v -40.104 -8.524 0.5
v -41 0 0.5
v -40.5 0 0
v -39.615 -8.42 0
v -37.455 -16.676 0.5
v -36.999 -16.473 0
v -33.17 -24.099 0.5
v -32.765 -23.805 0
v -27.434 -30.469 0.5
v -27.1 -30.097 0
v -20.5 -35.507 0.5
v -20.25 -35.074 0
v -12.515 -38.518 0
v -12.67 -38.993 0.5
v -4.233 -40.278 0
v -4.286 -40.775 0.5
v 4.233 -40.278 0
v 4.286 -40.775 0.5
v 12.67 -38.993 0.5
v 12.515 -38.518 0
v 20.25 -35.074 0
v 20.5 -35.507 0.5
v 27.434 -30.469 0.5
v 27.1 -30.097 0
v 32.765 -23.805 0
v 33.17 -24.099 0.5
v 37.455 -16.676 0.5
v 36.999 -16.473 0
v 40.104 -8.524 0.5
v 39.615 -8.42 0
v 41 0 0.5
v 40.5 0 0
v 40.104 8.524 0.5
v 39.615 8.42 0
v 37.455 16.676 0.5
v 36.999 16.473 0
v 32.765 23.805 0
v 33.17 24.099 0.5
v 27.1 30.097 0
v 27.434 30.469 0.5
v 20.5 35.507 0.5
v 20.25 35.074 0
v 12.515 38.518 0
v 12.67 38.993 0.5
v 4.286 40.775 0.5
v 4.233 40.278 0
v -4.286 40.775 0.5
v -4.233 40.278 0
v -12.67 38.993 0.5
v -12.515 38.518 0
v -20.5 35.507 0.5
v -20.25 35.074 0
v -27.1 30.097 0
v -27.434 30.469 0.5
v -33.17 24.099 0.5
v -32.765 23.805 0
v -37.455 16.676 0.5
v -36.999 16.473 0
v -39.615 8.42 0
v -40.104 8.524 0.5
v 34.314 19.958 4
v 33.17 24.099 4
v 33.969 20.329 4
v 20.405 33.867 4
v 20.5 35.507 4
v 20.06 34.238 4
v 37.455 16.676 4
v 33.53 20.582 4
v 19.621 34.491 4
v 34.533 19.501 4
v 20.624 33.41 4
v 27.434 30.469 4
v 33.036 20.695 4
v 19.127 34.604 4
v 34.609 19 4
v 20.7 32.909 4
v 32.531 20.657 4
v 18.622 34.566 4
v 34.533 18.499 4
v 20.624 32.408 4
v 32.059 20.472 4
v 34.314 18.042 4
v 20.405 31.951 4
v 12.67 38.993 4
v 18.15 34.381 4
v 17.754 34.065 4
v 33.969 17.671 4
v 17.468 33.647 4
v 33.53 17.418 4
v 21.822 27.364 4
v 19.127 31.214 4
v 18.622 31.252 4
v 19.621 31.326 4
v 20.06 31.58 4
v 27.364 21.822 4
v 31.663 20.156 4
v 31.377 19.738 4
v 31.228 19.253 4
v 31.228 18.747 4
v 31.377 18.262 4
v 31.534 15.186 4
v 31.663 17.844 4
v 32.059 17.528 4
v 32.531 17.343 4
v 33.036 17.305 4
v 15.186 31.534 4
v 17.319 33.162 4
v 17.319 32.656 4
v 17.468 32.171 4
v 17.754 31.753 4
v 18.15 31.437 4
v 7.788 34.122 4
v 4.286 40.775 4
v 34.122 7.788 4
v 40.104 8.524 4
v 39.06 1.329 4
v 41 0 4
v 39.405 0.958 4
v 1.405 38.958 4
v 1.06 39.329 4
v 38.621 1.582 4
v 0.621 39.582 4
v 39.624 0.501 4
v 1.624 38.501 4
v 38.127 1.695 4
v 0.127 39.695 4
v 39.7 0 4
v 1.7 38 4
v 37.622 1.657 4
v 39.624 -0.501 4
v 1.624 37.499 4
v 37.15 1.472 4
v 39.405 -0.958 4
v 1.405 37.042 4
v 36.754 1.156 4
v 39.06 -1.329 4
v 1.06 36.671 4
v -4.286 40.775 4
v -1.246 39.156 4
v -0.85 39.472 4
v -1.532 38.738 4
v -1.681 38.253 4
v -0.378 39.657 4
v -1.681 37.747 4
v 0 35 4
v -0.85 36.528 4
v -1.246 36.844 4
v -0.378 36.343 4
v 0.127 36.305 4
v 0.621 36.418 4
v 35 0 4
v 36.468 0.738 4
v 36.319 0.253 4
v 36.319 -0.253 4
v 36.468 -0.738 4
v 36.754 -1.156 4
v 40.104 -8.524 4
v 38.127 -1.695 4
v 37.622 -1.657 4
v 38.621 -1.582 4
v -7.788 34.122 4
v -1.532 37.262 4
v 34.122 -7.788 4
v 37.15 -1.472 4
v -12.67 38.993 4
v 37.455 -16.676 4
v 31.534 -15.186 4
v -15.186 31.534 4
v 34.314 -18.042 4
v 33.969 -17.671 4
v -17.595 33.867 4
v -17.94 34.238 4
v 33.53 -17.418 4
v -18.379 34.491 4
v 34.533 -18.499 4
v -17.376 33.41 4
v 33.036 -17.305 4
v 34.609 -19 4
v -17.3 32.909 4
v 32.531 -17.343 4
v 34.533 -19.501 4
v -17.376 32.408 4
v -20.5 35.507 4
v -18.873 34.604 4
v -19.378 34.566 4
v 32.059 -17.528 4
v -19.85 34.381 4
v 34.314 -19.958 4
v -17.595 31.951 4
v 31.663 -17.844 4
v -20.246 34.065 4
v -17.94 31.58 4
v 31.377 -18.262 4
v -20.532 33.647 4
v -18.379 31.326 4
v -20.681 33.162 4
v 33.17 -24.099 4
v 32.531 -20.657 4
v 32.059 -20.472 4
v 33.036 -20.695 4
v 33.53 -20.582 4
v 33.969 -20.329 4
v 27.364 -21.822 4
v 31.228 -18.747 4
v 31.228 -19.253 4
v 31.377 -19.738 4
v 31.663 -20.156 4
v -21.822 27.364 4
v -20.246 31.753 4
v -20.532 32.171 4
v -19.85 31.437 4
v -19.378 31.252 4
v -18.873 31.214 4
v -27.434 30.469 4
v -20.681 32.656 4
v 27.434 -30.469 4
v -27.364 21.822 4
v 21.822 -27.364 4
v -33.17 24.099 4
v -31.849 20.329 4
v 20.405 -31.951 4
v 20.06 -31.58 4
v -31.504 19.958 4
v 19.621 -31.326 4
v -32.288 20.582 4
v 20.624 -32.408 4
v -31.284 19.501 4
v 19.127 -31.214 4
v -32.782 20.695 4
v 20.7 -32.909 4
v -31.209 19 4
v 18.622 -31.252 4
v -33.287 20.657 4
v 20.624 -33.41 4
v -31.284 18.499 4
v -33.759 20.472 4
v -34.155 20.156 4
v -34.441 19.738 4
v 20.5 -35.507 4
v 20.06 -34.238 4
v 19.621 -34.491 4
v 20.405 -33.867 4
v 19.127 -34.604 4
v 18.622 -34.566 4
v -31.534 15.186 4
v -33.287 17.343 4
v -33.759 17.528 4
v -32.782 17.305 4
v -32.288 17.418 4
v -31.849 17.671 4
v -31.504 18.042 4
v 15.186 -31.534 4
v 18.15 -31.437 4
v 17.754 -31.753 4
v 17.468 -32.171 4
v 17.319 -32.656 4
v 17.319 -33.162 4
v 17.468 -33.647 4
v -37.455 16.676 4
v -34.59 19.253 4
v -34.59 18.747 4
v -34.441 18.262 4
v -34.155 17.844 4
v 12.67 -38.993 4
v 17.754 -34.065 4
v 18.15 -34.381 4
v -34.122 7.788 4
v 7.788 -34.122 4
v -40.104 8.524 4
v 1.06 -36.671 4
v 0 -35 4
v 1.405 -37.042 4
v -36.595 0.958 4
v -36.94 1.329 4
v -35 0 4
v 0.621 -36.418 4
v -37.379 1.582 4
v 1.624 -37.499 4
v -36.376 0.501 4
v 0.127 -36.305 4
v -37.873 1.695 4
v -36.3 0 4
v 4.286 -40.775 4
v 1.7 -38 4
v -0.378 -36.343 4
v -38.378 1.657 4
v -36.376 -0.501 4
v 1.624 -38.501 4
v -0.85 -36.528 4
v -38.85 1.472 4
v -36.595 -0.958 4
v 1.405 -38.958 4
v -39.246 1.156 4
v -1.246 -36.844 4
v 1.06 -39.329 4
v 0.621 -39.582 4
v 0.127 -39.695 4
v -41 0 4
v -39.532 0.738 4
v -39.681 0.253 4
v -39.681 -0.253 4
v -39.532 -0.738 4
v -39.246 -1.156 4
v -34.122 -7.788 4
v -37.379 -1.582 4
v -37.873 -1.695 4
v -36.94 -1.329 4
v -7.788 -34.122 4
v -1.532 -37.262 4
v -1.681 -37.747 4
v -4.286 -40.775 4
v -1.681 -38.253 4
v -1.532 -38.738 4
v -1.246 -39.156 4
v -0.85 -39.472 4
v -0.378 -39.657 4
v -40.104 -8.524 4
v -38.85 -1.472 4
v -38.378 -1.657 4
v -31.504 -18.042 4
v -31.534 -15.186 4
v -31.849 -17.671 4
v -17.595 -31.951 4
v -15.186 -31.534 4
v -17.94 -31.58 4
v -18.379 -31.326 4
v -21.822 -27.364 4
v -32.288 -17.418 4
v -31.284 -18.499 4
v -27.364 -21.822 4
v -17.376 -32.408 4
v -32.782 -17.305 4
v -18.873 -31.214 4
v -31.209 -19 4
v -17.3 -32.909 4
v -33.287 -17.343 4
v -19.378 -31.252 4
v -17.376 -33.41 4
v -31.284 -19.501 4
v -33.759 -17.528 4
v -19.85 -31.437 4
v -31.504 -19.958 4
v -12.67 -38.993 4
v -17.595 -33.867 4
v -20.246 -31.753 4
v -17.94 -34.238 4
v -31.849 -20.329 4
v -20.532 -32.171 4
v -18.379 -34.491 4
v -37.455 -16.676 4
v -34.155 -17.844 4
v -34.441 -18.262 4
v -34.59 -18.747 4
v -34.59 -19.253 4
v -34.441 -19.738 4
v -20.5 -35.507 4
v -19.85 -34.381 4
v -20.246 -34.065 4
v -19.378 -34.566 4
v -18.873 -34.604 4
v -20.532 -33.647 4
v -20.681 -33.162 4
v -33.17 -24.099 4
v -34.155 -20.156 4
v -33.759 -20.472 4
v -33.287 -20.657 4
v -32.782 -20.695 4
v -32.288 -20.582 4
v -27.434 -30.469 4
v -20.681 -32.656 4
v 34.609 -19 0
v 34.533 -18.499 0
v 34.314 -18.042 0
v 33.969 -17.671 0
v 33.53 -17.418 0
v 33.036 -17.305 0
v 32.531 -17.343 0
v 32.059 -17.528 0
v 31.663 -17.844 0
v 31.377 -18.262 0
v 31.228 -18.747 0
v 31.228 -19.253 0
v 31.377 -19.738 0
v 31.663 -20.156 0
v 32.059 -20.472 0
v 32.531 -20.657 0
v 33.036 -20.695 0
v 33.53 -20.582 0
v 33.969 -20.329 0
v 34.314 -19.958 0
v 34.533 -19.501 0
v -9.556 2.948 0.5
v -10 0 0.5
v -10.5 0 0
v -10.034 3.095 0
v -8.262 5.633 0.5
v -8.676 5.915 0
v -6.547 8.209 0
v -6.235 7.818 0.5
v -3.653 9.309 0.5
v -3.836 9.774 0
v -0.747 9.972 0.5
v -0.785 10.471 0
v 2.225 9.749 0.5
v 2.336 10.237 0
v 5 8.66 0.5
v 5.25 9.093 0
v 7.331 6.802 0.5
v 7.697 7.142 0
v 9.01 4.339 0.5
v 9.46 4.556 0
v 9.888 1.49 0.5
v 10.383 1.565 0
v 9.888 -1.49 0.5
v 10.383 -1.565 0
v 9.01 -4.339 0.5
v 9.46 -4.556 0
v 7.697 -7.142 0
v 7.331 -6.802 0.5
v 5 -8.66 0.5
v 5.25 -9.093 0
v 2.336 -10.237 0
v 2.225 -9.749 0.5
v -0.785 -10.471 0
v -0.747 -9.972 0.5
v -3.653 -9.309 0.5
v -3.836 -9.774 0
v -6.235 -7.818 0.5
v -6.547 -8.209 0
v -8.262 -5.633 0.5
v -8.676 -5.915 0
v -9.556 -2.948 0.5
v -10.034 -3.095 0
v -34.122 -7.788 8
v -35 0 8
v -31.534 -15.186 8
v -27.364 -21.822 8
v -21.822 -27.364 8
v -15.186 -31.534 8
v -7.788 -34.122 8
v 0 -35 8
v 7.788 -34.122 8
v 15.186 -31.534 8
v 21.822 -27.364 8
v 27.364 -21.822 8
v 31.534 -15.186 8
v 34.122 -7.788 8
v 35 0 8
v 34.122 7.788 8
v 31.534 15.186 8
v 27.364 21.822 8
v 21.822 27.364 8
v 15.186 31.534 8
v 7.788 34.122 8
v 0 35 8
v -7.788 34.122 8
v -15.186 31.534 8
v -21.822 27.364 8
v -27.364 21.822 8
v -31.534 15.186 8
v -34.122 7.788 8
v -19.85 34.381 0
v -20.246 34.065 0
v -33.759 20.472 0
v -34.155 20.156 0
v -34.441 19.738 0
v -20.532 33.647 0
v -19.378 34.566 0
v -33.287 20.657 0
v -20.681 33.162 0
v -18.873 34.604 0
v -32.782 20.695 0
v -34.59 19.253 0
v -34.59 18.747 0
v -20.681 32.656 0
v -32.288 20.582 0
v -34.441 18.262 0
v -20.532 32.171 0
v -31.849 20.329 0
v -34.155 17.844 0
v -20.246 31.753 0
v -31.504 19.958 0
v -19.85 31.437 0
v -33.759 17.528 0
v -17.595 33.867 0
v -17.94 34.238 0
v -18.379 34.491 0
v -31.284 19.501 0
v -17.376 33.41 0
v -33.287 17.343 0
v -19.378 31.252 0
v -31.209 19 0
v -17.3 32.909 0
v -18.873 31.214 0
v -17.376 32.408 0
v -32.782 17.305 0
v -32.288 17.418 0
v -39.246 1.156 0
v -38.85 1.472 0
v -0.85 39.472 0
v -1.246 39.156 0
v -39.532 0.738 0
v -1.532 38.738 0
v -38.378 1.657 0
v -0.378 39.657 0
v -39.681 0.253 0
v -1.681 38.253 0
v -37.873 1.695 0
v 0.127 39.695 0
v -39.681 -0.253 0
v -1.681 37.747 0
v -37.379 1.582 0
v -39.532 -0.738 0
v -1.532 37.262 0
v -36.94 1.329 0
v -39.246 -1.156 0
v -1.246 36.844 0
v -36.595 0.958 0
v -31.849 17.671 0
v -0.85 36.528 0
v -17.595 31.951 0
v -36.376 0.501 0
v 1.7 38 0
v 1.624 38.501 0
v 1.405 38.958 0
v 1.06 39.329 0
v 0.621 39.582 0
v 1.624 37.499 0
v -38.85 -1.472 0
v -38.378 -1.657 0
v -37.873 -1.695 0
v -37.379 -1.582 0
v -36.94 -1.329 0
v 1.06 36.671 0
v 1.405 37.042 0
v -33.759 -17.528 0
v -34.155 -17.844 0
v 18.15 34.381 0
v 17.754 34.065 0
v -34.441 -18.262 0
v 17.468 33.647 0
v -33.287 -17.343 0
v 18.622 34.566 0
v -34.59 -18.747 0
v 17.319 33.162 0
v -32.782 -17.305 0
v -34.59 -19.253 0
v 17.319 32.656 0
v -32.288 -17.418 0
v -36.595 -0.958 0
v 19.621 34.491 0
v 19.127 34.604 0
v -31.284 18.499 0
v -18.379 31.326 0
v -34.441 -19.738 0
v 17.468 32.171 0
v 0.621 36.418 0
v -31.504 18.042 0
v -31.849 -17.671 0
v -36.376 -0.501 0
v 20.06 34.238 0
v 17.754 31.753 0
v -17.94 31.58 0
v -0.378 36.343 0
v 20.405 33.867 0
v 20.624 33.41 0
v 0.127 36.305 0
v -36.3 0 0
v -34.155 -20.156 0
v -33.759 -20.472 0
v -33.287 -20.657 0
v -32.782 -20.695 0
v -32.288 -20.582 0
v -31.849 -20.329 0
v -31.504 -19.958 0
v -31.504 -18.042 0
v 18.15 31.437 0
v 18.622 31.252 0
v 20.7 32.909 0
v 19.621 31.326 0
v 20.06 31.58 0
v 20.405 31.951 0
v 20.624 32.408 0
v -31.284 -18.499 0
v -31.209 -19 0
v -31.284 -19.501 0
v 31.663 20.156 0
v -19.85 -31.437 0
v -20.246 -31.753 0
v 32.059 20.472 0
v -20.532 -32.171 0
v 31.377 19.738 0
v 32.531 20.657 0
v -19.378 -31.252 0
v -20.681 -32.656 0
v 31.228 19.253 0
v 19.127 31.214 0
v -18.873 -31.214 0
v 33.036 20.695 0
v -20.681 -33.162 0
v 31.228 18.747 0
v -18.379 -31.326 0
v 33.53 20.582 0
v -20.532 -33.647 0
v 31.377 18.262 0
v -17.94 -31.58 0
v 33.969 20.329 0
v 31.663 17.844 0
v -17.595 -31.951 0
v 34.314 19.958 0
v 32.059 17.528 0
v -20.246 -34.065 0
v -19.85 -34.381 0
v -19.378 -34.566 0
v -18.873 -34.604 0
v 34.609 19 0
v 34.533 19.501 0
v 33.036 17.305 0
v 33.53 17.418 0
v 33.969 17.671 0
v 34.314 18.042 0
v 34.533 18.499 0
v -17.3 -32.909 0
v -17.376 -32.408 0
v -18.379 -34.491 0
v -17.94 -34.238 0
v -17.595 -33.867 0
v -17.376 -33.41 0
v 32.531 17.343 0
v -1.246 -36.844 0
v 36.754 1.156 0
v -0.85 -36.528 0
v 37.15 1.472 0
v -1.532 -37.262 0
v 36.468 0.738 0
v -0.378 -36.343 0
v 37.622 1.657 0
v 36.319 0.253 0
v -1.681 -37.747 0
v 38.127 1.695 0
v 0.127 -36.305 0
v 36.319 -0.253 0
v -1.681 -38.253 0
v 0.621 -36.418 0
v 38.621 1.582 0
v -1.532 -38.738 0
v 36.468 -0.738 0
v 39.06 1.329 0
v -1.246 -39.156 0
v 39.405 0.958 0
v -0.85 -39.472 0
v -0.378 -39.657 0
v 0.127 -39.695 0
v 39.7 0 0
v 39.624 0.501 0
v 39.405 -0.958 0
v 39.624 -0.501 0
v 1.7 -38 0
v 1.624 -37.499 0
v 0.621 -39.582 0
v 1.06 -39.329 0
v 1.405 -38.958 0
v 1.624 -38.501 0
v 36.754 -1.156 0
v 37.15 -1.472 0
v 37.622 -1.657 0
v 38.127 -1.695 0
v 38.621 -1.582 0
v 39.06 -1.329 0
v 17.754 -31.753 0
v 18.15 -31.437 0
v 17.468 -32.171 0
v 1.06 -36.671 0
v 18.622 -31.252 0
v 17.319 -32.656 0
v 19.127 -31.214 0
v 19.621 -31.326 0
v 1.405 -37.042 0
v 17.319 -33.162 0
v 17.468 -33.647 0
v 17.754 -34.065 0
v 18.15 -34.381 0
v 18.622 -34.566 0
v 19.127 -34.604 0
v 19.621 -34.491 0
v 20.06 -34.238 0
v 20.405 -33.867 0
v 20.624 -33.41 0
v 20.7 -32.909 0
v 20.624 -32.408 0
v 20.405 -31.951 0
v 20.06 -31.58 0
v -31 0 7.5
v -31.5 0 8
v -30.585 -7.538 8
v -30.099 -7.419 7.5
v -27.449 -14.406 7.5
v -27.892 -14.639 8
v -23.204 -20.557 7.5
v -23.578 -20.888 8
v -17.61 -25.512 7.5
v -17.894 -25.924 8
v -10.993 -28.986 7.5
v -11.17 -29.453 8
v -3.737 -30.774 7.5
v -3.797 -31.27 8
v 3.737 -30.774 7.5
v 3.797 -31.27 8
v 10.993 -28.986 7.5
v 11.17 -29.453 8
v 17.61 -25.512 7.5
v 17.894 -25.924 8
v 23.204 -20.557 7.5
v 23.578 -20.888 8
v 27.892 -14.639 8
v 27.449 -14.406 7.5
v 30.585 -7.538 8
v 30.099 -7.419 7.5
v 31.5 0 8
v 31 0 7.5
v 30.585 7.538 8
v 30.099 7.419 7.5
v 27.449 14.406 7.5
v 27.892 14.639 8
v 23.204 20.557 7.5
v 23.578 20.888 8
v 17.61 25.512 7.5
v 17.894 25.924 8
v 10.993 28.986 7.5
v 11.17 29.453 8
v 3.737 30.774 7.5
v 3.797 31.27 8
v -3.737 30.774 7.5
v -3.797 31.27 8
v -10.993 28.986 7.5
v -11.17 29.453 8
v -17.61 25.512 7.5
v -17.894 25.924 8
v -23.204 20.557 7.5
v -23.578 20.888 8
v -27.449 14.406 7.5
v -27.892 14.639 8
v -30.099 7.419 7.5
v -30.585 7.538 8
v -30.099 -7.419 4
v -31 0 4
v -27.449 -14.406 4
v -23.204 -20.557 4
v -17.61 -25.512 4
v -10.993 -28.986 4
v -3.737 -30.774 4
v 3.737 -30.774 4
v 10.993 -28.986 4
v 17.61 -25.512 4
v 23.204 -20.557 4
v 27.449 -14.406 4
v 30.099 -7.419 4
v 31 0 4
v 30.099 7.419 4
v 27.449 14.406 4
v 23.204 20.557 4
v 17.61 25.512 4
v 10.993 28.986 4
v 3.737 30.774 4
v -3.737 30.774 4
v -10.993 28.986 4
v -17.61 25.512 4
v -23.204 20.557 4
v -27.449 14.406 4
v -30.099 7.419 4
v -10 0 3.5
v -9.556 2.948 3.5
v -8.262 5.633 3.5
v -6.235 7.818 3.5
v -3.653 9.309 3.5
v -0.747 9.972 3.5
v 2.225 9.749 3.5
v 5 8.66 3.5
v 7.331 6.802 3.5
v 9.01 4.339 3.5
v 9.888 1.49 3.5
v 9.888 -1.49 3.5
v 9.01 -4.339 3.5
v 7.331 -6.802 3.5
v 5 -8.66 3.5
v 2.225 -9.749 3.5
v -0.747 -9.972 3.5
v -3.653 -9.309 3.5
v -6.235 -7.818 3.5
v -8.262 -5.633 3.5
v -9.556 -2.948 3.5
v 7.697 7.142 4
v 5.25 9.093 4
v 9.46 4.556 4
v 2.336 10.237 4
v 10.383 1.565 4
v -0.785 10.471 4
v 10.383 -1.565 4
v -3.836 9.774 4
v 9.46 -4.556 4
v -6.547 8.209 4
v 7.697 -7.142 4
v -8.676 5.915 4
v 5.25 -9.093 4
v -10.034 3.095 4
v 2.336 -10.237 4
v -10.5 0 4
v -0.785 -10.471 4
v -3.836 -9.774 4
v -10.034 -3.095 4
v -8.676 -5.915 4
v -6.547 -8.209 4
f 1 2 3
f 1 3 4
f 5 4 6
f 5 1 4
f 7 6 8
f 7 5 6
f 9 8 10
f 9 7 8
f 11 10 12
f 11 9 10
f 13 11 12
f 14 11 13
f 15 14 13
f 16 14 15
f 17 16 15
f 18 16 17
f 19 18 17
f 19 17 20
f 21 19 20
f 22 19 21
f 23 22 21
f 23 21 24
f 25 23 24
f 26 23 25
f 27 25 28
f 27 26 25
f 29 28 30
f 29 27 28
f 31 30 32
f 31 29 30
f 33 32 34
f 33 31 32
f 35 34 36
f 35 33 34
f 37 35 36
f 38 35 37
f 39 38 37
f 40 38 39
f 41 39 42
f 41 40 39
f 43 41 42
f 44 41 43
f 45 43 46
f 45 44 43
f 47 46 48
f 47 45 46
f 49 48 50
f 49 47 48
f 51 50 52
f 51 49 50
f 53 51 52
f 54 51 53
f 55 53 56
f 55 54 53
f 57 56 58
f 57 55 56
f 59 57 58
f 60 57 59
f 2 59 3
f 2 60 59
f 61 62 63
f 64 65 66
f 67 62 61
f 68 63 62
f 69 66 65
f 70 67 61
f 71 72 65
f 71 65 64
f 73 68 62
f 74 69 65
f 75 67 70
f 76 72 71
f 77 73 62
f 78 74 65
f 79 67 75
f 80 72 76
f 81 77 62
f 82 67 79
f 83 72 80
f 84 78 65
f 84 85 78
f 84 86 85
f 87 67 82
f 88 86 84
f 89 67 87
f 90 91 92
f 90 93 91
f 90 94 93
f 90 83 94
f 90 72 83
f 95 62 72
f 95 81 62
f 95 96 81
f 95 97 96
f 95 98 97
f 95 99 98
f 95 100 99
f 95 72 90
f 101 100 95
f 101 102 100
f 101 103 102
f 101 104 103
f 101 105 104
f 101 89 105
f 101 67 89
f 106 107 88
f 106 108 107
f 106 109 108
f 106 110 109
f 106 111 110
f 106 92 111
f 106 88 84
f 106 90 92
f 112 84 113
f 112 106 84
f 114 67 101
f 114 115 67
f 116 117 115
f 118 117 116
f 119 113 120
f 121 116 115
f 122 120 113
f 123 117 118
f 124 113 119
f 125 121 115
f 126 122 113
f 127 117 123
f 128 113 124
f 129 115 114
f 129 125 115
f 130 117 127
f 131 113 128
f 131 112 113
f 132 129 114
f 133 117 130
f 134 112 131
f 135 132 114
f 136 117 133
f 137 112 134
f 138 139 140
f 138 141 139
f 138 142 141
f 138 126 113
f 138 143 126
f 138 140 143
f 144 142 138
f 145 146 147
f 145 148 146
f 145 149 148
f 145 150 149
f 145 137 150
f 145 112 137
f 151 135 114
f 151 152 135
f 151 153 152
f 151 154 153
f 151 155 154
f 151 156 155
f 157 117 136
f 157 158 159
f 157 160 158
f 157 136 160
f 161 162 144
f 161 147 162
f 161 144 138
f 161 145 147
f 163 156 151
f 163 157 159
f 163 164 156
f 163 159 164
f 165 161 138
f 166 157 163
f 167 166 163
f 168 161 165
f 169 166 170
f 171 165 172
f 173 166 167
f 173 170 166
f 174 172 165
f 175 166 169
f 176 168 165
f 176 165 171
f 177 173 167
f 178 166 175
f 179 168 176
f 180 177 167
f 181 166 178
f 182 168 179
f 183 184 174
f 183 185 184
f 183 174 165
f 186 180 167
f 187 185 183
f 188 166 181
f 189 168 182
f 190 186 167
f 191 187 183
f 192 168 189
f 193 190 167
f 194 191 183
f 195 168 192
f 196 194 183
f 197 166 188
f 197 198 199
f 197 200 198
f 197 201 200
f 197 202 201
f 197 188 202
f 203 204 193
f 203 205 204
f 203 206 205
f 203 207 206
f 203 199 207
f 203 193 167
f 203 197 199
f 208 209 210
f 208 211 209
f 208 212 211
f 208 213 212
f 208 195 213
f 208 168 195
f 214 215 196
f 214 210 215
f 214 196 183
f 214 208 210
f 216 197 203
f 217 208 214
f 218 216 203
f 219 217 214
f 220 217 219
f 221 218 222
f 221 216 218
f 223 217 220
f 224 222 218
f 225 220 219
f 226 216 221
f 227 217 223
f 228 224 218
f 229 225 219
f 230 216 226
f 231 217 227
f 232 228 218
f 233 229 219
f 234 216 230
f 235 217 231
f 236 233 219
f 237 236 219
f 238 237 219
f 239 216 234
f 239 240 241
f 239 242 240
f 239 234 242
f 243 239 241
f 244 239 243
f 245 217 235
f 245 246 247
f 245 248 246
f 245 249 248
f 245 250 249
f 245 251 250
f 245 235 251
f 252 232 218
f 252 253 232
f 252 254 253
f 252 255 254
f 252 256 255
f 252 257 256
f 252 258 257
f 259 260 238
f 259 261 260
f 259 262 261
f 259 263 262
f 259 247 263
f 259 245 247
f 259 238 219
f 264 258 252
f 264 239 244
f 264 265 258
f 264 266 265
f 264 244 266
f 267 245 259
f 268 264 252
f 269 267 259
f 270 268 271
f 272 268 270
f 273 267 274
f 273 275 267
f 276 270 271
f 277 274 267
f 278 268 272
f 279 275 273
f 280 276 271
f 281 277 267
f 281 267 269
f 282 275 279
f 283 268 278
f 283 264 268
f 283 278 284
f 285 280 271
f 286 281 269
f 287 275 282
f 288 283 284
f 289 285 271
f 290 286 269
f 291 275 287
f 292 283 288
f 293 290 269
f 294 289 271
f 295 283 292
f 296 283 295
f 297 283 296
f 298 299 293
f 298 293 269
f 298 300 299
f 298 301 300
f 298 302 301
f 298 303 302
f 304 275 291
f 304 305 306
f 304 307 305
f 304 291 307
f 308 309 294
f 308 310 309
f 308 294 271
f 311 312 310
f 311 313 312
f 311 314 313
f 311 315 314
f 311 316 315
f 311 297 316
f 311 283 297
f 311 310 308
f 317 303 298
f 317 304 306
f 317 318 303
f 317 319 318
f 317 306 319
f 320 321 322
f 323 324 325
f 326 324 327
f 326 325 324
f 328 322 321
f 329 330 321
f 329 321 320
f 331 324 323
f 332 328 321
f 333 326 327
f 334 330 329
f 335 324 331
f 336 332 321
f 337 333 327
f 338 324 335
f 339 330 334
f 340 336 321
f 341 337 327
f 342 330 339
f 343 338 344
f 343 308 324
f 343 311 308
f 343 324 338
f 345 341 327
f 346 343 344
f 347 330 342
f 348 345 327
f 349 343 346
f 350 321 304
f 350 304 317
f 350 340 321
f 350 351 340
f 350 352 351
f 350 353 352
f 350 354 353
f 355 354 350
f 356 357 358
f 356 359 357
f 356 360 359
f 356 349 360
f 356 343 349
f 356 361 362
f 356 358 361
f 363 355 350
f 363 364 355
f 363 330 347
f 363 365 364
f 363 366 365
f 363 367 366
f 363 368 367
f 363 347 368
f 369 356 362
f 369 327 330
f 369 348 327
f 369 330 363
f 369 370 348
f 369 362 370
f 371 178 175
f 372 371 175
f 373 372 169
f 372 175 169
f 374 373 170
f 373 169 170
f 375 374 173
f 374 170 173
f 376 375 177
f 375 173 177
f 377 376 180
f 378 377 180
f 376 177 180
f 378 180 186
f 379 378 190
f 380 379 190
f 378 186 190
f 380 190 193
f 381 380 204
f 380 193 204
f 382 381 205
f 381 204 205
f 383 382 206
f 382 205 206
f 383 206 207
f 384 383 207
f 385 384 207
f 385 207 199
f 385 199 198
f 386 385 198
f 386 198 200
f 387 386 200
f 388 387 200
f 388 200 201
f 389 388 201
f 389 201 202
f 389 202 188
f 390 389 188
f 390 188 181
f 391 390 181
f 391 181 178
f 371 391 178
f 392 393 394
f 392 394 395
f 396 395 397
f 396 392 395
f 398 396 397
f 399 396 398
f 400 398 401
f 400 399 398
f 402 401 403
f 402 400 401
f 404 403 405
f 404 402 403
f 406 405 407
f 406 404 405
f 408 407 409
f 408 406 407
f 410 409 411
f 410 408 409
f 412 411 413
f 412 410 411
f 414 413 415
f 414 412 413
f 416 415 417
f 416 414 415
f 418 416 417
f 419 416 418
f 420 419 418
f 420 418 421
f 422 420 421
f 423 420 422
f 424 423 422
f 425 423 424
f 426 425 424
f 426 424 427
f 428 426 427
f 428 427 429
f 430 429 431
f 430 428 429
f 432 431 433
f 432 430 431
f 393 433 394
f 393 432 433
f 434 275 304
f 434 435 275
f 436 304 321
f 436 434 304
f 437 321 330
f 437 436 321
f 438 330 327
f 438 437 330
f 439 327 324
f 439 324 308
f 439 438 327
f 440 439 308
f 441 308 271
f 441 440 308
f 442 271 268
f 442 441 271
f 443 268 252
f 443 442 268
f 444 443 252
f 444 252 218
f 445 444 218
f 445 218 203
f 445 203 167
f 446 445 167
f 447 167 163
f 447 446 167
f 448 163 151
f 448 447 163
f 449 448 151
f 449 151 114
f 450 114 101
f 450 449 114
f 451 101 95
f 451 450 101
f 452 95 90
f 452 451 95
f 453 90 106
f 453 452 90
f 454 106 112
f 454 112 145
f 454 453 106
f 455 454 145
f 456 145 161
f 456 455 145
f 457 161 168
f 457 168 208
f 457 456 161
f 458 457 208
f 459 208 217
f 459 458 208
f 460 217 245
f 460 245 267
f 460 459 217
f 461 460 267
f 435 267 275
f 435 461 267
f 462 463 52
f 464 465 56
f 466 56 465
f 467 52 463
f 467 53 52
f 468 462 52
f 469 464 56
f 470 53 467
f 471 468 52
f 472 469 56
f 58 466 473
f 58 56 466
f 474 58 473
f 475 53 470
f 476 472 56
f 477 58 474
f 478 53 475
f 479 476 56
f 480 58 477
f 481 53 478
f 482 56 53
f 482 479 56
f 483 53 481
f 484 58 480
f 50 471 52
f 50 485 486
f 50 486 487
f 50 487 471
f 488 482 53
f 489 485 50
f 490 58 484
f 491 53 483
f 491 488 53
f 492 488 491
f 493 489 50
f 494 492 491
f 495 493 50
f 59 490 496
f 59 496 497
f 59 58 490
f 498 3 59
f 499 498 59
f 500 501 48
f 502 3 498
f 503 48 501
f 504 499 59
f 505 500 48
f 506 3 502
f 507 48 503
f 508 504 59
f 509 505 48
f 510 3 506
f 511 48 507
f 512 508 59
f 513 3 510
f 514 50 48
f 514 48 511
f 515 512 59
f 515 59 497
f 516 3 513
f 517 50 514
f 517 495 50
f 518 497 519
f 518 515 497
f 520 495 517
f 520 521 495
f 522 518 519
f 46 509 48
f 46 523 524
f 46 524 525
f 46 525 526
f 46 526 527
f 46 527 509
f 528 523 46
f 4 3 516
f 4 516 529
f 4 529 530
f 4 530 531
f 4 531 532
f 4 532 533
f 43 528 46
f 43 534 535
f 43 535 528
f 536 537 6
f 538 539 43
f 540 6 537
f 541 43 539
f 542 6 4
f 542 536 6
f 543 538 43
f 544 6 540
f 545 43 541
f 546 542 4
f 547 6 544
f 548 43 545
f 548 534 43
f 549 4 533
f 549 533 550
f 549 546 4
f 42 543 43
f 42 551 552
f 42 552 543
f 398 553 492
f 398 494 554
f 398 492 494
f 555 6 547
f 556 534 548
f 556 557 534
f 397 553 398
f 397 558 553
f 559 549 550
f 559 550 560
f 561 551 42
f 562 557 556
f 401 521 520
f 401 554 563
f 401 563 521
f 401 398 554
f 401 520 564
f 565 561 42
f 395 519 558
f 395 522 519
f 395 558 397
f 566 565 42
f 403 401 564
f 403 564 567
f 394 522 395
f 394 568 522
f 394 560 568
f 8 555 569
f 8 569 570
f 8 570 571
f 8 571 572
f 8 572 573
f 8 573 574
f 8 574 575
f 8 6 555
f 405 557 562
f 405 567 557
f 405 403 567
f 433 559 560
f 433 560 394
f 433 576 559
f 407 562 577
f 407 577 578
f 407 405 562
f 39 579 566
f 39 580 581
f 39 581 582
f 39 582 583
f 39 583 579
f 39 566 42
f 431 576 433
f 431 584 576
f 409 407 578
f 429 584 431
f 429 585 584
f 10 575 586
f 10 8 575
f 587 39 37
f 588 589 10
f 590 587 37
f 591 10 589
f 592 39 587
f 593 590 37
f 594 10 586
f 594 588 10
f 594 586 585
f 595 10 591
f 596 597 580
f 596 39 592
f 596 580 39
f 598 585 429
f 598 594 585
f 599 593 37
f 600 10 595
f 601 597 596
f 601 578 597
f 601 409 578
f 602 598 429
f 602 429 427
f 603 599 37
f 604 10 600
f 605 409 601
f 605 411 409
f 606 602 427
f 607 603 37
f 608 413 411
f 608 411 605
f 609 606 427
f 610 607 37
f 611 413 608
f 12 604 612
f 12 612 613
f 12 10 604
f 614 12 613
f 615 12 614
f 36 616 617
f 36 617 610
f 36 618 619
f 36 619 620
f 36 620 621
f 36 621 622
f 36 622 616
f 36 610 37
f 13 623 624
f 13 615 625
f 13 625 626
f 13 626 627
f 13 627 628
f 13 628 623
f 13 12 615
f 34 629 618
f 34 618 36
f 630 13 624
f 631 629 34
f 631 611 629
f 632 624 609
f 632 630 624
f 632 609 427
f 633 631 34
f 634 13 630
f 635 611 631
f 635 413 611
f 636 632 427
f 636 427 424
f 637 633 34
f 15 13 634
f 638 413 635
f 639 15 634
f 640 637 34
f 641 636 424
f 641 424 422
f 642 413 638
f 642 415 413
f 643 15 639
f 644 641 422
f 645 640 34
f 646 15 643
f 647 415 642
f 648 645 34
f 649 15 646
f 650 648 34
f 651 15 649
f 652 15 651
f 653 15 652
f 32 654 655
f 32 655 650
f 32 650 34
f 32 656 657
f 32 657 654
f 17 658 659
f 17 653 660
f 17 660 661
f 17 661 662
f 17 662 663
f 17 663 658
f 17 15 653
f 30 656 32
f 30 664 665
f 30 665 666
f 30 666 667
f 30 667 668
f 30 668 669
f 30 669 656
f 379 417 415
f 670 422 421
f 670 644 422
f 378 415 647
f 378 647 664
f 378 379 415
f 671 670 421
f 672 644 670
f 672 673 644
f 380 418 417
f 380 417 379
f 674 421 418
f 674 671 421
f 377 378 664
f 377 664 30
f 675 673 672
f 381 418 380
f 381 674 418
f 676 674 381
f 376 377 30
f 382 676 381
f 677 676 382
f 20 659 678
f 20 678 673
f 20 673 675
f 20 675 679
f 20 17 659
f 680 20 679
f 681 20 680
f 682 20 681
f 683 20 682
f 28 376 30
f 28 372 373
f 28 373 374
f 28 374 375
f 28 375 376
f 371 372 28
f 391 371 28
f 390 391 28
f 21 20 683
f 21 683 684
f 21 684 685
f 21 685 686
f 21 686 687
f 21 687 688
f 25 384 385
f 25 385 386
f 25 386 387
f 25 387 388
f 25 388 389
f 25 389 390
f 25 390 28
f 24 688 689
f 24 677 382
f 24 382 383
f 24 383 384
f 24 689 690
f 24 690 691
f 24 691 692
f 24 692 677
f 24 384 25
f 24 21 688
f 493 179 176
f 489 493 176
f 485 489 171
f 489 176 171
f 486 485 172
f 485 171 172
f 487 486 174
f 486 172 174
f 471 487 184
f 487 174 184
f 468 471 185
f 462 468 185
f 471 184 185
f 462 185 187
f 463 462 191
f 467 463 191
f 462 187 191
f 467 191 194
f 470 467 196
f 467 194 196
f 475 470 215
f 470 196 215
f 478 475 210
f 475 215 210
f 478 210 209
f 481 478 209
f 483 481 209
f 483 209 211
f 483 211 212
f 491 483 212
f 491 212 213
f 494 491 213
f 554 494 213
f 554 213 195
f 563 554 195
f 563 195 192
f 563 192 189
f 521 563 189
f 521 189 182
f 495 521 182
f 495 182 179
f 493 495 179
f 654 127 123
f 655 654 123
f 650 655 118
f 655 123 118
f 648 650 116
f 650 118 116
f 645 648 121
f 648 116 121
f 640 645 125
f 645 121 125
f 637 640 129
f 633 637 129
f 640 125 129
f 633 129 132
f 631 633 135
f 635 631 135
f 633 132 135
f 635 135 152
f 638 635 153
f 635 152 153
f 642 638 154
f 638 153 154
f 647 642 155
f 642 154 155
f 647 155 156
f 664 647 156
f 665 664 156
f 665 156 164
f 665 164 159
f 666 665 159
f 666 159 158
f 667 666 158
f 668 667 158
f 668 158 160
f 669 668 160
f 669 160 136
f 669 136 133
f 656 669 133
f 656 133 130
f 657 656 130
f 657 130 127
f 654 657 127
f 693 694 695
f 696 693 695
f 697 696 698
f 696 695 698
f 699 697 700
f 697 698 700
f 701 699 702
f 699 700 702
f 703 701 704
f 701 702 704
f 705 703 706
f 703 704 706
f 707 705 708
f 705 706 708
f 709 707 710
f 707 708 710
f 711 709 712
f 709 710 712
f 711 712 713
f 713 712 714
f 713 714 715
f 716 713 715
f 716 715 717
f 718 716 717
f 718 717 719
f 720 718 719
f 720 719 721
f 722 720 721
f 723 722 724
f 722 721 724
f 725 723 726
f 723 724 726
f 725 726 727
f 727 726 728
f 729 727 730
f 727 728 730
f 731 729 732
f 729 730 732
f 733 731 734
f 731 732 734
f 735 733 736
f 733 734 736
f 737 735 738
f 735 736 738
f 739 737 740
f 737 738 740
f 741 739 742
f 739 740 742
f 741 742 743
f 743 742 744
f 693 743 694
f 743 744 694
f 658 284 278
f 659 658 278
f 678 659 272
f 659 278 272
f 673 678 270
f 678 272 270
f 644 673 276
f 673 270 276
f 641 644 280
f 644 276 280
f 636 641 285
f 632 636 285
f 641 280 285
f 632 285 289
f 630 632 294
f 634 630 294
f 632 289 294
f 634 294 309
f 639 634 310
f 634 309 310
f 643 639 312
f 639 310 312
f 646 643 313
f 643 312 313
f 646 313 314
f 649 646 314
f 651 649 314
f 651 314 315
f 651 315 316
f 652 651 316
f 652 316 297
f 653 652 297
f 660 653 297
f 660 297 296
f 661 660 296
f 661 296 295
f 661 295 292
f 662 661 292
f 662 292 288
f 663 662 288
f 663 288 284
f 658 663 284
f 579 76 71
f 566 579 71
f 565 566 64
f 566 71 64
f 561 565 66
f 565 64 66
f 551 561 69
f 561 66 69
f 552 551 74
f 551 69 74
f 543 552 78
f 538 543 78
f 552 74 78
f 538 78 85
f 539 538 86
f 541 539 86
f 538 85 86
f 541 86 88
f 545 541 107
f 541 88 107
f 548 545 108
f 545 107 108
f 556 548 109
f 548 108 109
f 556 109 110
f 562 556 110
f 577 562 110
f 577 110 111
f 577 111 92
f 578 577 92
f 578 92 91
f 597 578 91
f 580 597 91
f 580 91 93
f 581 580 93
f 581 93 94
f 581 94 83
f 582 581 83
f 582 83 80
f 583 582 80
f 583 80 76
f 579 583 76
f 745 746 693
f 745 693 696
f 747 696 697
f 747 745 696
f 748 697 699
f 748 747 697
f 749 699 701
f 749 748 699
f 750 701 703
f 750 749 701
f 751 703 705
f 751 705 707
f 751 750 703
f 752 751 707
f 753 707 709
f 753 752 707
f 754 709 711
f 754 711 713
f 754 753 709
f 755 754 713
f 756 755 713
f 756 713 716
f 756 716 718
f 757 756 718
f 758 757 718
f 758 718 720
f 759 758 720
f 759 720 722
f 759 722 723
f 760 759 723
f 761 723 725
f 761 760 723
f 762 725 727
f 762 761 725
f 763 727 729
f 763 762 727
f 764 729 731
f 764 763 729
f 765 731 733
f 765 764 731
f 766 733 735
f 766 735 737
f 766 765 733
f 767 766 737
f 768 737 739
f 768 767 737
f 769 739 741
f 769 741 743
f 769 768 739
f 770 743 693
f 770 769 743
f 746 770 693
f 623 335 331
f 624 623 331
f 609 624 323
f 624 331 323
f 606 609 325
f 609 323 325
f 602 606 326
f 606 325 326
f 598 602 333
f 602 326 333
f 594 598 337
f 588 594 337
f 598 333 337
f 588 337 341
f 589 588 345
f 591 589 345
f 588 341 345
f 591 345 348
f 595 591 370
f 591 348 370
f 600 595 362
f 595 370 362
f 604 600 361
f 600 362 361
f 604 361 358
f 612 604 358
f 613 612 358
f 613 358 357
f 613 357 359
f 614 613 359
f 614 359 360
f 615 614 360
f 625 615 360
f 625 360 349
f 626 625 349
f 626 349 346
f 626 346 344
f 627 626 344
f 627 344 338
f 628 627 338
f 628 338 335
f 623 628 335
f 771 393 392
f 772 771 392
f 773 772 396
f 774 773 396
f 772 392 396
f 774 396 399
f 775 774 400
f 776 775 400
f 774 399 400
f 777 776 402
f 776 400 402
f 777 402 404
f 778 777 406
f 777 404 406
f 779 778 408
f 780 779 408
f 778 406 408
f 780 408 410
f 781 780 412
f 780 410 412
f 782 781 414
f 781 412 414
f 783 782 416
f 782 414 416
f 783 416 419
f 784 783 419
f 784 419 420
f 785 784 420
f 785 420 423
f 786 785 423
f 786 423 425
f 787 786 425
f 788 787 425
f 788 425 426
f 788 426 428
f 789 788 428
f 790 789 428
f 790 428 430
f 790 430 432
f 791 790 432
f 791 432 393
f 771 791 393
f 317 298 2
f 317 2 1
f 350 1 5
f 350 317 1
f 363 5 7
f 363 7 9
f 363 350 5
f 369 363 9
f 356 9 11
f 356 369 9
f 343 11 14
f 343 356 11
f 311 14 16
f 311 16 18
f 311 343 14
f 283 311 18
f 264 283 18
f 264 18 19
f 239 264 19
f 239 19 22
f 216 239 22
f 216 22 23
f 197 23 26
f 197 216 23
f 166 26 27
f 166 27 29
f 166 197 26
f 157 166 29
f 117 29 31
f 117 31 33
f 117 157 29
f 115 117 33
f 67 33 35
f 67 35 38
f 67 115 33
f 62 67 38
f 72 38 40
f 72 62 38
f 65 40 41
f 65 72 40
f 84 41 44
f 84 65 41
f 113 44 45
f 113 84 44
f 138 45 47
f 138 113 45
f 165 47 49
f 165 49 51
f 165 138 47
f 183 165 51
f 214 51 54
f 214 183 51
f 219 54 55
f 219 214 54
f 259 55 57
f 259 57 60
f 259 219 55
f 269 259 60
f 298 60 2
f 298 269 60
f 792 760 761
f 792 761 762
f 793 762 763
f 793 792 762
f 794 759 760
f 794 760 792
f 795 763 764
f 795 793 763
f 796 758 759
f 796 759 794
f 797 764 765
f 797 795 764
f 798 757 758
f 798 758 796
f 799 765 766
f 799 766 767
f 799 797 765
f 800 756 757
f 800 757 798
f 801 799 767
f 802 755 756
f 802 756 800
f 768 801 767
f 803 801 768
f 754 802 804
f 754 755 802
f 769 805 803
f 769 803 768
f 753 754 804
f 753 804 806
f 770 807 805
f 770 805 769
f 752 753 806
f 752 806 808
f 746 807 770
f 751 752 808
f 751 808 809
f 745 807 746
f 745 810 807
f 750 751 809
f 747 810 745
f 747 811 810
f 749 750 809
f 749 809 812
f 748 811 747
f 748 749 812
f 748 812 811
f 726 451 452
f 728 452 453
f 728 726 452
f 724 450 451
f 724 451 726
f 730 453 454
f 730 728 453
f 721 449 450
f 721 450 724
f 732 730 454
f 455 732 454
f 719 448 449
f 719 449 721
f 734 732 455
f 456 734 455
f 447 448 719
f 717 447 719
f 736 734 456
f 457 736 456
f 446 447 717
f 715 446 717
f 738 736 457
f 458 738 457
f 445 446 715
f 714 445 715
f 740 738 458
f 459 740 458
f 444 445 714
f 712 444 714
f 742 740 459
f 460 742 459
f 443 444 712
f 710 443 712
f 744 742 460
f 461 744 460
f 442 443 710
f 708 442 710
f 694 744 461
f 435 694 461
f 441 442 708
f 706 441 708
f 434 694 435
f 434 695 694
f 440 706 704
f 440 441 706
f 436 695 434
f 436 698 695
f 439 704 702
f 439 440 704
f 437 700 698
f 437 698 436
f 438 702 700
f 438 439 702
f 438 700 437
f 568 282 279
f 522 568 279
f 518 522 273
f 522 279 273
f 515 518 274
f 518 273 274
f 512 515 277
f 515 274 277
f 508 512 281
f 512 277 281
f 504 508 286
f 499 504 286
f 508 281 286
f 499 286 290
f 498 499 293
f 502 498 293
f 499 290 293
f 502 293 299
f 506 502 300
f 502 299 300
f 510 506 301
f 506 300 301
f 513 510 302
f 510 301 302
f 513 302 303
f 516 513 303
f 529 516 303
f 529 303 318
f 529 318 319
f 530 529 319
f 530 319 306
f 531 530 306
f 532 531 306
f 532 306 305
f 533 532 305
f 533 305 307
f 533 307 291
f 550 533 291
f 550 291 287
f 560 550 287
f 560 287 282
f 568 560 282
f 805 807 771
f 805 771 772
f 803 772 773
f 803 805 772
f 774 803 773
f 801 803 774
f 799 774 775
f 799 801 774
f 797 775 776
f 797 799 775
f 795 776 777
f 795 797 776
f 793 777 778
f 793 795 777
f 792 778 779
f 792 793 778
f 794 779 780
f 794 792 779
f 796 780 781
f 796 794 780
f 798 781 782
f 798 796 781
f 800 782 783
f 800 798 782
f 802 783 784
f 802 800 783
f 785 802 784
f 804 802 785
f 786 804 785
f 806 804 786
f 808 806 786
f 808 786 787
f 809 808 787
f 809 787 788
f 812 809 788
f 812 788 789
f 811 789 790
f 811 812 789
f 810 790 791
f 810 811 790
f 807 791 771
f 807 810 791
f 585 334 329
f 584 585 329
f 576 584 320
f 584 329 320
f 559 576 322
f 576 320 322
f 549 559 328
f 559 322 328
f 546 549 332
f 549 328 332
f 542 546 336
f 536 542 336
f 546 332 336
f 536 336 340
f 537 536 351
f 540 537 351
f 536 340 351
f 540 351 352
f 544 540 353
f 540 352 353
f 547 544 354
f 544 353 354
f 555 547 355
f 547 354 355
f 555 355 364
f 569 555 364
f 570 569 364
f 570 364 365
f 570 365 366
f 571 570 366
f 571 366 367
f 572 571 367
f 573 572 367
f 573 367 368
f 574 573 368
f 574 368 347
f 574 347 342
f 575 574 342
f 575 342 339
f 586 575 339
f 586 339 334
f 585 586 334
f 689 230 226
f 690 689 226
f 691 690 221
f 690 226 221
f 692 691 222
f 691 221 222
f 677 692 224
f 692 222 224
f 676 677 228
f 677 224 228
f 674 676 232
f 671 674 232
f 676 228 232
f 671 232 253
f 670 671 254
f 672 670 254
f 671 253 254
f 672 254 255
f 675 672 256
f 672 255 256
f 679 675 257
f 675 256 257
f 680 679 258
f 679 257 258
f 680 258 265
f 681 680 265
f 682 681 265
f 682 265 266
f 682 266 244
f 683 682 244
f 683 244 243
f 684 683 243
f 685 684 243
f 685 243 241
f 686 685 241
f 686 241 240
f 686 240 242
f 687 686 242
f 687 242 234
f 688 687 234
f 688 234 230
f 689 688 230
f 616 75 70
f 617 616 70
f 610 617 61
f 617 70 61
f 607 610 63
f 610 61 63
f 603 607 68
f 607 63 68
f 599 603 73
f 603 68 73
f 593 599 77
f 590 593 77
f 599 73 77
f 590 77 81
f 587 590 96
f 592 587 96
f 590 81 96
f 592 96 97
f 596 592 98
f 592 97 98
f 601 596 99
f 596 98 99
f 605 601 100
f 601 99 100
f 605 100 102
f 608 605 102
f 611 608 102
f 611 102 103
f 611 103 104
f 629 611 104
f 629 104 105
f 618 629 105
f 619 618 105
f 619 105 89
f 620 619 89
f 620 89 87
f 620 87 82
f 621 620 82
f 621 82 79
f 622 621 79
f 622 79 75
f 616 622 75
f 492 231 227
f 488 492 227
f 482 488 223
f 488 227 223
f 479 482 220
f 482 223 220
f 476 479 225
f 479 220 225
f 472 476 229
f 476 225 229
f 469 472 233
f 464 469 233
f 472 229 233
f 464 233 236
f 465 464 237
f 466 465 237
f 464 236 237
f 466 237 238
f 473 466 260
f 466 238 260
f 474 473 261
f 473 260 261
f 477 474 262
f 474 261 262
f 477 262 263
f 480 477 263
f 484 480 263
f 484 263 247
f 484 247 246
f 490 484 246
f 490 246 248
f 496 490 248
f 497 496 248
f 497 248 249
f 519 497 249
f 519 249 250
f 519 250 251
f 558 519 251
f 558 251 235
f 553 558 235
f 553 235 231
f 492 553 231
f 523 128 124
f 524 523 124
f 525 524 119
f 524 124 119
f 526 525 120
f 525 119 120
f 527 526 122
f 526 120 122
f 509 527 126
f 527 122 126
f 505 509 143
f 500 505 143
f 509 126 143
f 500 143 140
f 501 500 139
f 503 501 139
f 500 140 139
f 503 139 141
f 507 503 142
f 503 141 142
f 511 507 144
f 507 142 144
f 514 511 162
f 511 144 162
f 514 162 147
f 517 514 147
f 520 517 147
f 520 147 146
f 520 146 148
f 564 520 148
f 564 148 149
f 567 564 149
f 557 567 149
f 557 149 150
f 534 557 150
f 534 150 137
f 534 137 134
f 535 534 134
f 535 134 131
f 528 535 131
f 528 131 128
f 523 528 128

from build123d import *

# Parameters (mm, degrees)
CUT_EXTRUDE_1_REACH = 60.121
SKETCH_2_R          = 1.7
CUT_EXTRUDE_2_REACH = 60.532
SKETCH_3_R          = 10
CHAMFER_1_SIZE      = 0.5


with BuildPart() as part:
    # 草图1 → 旋转1 (revolve)
    with BuildSketch(Plane(origin=(0, 0, 0), x_dir=(0, 0, -1), z_dir=(1, 0, 0)), mode=Mode.PRIVATE) as revolve_1_sk:
        Polygon((0, 0), (0, 41), (-4, 41), (-4, 35), (-8, 35), (-8, 31), (-4, 31), (-4, 0), align=None)
    revolve(revolve_1_sk.sketch.rotate(Axis((0, 0, 0), (0, 0, 1)), 90), axis=Axis((0, 0, 0), (0, 0, 1)))

    # 草图2 → 切除-拉伸1 (cut, up to next)
    with BuildSketch(Plane.XY.offset(4), mode=Mode.PRIVATE) as cut_extrude_1_sk1:
        with Locations((0, 38)):
            Circle(SKETCH_2_R)
    cut_extrude_1_tool1 = extrude(cut_extrude_1_sk1.sketch, amount=-CUT_EXTRUDE_1_REACH, mode=Mode.PRIVATE) & part.part
    # 草图2 → 切除-拉伸1 (cut, up to next)
    with BuildSketch(Plane.XY.offset(4), mode=Mode.PRIVATE) as cut_extrude_1_sk2:
        with Locations((19, 32.908965344)):
            Circle(SKETCH_2_R)
    cut_extrude_1_tool2 = extrude(cut_extrude_1_sk2.sketch, amount=-CUT_EXTRUDE_1_REACH, mode=Mode.PRIVATE) & part.part
    # 草图2 → 切除-拉伸1 (cut, up to next)
    with BuildSketch(Plane.XY.offset(4), mode=Mode.PRIVATE) as cut_extrude_1_sk3:
        with Locations((32.908965344, 19)):
            Circle(SKETCH_2_R)
    cut_extrude_1_tool3 = extrude(cut_extrude_1_sk3.sketch, amount=-CUT_EXTRUDE_1_REACH, mode=Mode.PRIVATE) & part.part
    # 草图2 → 切除-拉伸1 (cut, up to next)
    with BuildSketch(Plane.XY.offset(4), mode=Mode.PRIVATE) as cut_extrude_1_sk4:
        with Locations((38, 0)):
            Circle(SKETCH_2_R)
    cut_extrude_1_tool4 = extrude(cut_extrude_1_sk4.sketch, amount=-CUT_EXTRUDE_1_REACH, mode=Mode.PRIVATE) & part.part
    # 草图2 → 切除-拉伸1 (cut, up to next)
    with BuildSketch(Plane.XY.offset(4), mode=Mode.PRIVATE) as cut_extrude_1_sk5:
        with Locations((32.908965344, -19)):
            Circle(SKETCH_2_R)
    cut_extrude_1_tool5 = extrude(cut_extrude_1_sk5.sketch, amount=-CUT_EXTRUDE_1_REACH, mode=Mode.PRIVATE) & part.part
    # 草图2 → 切除-拉伸1 (cut, up to next)
    with BuildSketch(Plane.XY.offset(4), mode=Mode.PRIVATE) as cut_extrude_1_sk6:
        with Locations((19, -32.908965344)):
            Circle(SKETCH_2_R)
    cut_extrude_1_tool6 = extrude(cut_extrude_1_sk6.sketch, amount=-CUT_EXTRUDE_1_REACH, mode=Mode.PRIVATE) & part.part
    # 草图2 → 切除-拉伸1 (cut, up to next)
    with BuildSketch(Plane.XY.offset(4), mode=Mode.PRIVATE) as cut_extrude_1_sk7:
        with Locations((0, -38)):
            Circle(SKETCH_2_R)
    cut_extrude_1_tool7 = extrude(cut_extrude_1_sk7.sketch, amount=-CUT_EXTRUDE_1_REACH, mode=Mode.PRIVATE) & part.part
    # 草图2 → 切除-拉伸1 (cut, up to next)
    with BuildSketch(Plane.XY.offset(4), mode=Mode.PRIVATE) as cut_extrude_1_sk8:
        with Locations((-19, -32.908965344)):
            Circle(SKETCH_2_R)
    cut_extrude_1_tool8 = extrude(cut_extrude_1_sk8.sketch, amount=-CUT_EXTRUDE_1_REACH, mode=Mode.PRIVATE) & part.part
    # 草图2 → 切除-拉伸1 (cut, up to next)
    with BuildSketch(Plane.XY.offset(4), mode=Mode.PRIVATE) as cut_extrude_1_sk9:
        with Locations((-32.908965344, -19)):
            Circle(SKETCH_2_R)
    cut_extrude_1_tool9 = extrude(cut_extrude_1_sk9.sketch, amount=-CUT_EXTRUDE_1_REACH, mode=Mode.PRIVATE) & part.part
    # 草图2 → 切除-拉伸1 (cut, up to next)
    with BuildSketch(Plane.XY.offset(4), mode=Mode.PRIVATE) as cut_extrude_1_sk10:
        with Locations((-38, 0)):
            Circle(SKETCH_2_R)
    cut_extrude_1_tool10 = extrude(cut_extrude_1_sk10.sketch, amount=-CUT_EXTRUDE_1_REACH, mode=Mode.PRIVATE) & part.part
    # 草图2 → 切除-拉伸1 (cut, up to next)
    with BuildSketch(Plane.XY.offset(4), mode=Mode.PRIVATE) as cut_extrude_1_sk11:
        with Locations((-32.908965344, 19)):
            Circle(SKETCH_2_R)
    cut_extrude_1_tool11 = extrude(cut_extrude_1_sk11.sketch, amount=-CUT_EXTRUDE_1_REACH, mode=Mode.PRIVATE) & part.part
    # 草图2 → 切除-拉伸1 (cut, up to next)
    with BuildSketch(Plane.XY.offset(4), mode=Mode.PRIVATE) as cut_extrude_1_sk12:
        with Locations((-19, 32.908965344)):
            Circle(SKETCH_2_R)
    cut_extrude_1_tool12 = extrude(cut_extrude_1_sk12.sketch, amount=-CUT_EXTRUDE_1_REACH, mode=Mode.PRIVATE) & part.part
    add(cut_extrude_1_tool1.solids().sort_by_distance((0, 38, 4))[0], mode=Mode.SUBTRACT)
    add(cut_extrude_1_tool2.solids().sort_by_distance((19, 32.908965, 4))[0], mode=Mode.SUBTRACT)
    add(cut_extrude_1_tool3.solids().sort_by_distance((32.908965, 19, 4))[0], mode=Mode.SUBTRACT)
    add(cut_extrude_1_tool4.solids().sort_by_distance((38, 0, 4))[0], mode=Mode.SUBTRACT)
    add(cut_extrude_1_tool5.solids().sort_by_distance((32.908965, -19, 4))[0], mode=Mode.SUBTRACT)
    add(cut_extrude_1_tool6.solids().sort_by_distance((19, -32.908965, 4))[0], mode=Mode.SUBTRACT)
    add(cut_extrude_1_tool7.solids().sort_by_distance((0, -38, 4))[0], mode=Mode.SUBTRACT)
    add(cut_extrude_1_tool8.solids().sort_by_distance((-19, -32.908965, 4))[0], mode=Mode.SUBTRACT)
    add(cut_extrude_1_tool9.solids().sort_by_distance((-32.908965, -19, 4))[0], mode=Mode.SUBTRACT)
    add(cut_extrude_1_tool10.solids().sort_by_distance((-38, 0, 4))[0], mode=Mode.SUBTRACT)
    add(cut_extrude_1_tool11.solids().sort_by_distance((-32.908965, 19, 4))[0], mode=Mode.SUBTRACT)
    add(cut_extrude_1_tool12.solids().sort_by_distance((-19, 32.908965, 4))[0], mode=Mode.SUBTRACT)

    # 草图3 → 切除-拉伸2 (cut, up to next)
    with BuildSketch(Plane(origin=(0, 0, 0), x_dir=(-1, 0, 0), z_dir=(0, 0, -1)), mode=Mode.PRIVATE) as cut_extrude_2_sk1:
        Circle(SKETCH_3_R)
    cut_extrude_2_tool1 = extrude(cut_extrude_2_sk1.sketch, amount=-CUT_EXTRUDE_2_REACH, mode=Mode.PRIVATE) & part.part
    add(cut_extrude_2_tool1.solids().sort_by_distance((0, 0, 0))[0], mode=Mode.SUBTRACT)

    # 倒角1
    chamfer_1_edges = [part.edges().sort_by_distance(p)[0] for p in [
        (10, 0, 4),
        (10, 0, 0),
        (31, 0, 8),
        (41, 0, 0),
    ]]
    chamfer(chamfer_1_edges, length=CHAMFER_1_SIZE)


solid = part.part
